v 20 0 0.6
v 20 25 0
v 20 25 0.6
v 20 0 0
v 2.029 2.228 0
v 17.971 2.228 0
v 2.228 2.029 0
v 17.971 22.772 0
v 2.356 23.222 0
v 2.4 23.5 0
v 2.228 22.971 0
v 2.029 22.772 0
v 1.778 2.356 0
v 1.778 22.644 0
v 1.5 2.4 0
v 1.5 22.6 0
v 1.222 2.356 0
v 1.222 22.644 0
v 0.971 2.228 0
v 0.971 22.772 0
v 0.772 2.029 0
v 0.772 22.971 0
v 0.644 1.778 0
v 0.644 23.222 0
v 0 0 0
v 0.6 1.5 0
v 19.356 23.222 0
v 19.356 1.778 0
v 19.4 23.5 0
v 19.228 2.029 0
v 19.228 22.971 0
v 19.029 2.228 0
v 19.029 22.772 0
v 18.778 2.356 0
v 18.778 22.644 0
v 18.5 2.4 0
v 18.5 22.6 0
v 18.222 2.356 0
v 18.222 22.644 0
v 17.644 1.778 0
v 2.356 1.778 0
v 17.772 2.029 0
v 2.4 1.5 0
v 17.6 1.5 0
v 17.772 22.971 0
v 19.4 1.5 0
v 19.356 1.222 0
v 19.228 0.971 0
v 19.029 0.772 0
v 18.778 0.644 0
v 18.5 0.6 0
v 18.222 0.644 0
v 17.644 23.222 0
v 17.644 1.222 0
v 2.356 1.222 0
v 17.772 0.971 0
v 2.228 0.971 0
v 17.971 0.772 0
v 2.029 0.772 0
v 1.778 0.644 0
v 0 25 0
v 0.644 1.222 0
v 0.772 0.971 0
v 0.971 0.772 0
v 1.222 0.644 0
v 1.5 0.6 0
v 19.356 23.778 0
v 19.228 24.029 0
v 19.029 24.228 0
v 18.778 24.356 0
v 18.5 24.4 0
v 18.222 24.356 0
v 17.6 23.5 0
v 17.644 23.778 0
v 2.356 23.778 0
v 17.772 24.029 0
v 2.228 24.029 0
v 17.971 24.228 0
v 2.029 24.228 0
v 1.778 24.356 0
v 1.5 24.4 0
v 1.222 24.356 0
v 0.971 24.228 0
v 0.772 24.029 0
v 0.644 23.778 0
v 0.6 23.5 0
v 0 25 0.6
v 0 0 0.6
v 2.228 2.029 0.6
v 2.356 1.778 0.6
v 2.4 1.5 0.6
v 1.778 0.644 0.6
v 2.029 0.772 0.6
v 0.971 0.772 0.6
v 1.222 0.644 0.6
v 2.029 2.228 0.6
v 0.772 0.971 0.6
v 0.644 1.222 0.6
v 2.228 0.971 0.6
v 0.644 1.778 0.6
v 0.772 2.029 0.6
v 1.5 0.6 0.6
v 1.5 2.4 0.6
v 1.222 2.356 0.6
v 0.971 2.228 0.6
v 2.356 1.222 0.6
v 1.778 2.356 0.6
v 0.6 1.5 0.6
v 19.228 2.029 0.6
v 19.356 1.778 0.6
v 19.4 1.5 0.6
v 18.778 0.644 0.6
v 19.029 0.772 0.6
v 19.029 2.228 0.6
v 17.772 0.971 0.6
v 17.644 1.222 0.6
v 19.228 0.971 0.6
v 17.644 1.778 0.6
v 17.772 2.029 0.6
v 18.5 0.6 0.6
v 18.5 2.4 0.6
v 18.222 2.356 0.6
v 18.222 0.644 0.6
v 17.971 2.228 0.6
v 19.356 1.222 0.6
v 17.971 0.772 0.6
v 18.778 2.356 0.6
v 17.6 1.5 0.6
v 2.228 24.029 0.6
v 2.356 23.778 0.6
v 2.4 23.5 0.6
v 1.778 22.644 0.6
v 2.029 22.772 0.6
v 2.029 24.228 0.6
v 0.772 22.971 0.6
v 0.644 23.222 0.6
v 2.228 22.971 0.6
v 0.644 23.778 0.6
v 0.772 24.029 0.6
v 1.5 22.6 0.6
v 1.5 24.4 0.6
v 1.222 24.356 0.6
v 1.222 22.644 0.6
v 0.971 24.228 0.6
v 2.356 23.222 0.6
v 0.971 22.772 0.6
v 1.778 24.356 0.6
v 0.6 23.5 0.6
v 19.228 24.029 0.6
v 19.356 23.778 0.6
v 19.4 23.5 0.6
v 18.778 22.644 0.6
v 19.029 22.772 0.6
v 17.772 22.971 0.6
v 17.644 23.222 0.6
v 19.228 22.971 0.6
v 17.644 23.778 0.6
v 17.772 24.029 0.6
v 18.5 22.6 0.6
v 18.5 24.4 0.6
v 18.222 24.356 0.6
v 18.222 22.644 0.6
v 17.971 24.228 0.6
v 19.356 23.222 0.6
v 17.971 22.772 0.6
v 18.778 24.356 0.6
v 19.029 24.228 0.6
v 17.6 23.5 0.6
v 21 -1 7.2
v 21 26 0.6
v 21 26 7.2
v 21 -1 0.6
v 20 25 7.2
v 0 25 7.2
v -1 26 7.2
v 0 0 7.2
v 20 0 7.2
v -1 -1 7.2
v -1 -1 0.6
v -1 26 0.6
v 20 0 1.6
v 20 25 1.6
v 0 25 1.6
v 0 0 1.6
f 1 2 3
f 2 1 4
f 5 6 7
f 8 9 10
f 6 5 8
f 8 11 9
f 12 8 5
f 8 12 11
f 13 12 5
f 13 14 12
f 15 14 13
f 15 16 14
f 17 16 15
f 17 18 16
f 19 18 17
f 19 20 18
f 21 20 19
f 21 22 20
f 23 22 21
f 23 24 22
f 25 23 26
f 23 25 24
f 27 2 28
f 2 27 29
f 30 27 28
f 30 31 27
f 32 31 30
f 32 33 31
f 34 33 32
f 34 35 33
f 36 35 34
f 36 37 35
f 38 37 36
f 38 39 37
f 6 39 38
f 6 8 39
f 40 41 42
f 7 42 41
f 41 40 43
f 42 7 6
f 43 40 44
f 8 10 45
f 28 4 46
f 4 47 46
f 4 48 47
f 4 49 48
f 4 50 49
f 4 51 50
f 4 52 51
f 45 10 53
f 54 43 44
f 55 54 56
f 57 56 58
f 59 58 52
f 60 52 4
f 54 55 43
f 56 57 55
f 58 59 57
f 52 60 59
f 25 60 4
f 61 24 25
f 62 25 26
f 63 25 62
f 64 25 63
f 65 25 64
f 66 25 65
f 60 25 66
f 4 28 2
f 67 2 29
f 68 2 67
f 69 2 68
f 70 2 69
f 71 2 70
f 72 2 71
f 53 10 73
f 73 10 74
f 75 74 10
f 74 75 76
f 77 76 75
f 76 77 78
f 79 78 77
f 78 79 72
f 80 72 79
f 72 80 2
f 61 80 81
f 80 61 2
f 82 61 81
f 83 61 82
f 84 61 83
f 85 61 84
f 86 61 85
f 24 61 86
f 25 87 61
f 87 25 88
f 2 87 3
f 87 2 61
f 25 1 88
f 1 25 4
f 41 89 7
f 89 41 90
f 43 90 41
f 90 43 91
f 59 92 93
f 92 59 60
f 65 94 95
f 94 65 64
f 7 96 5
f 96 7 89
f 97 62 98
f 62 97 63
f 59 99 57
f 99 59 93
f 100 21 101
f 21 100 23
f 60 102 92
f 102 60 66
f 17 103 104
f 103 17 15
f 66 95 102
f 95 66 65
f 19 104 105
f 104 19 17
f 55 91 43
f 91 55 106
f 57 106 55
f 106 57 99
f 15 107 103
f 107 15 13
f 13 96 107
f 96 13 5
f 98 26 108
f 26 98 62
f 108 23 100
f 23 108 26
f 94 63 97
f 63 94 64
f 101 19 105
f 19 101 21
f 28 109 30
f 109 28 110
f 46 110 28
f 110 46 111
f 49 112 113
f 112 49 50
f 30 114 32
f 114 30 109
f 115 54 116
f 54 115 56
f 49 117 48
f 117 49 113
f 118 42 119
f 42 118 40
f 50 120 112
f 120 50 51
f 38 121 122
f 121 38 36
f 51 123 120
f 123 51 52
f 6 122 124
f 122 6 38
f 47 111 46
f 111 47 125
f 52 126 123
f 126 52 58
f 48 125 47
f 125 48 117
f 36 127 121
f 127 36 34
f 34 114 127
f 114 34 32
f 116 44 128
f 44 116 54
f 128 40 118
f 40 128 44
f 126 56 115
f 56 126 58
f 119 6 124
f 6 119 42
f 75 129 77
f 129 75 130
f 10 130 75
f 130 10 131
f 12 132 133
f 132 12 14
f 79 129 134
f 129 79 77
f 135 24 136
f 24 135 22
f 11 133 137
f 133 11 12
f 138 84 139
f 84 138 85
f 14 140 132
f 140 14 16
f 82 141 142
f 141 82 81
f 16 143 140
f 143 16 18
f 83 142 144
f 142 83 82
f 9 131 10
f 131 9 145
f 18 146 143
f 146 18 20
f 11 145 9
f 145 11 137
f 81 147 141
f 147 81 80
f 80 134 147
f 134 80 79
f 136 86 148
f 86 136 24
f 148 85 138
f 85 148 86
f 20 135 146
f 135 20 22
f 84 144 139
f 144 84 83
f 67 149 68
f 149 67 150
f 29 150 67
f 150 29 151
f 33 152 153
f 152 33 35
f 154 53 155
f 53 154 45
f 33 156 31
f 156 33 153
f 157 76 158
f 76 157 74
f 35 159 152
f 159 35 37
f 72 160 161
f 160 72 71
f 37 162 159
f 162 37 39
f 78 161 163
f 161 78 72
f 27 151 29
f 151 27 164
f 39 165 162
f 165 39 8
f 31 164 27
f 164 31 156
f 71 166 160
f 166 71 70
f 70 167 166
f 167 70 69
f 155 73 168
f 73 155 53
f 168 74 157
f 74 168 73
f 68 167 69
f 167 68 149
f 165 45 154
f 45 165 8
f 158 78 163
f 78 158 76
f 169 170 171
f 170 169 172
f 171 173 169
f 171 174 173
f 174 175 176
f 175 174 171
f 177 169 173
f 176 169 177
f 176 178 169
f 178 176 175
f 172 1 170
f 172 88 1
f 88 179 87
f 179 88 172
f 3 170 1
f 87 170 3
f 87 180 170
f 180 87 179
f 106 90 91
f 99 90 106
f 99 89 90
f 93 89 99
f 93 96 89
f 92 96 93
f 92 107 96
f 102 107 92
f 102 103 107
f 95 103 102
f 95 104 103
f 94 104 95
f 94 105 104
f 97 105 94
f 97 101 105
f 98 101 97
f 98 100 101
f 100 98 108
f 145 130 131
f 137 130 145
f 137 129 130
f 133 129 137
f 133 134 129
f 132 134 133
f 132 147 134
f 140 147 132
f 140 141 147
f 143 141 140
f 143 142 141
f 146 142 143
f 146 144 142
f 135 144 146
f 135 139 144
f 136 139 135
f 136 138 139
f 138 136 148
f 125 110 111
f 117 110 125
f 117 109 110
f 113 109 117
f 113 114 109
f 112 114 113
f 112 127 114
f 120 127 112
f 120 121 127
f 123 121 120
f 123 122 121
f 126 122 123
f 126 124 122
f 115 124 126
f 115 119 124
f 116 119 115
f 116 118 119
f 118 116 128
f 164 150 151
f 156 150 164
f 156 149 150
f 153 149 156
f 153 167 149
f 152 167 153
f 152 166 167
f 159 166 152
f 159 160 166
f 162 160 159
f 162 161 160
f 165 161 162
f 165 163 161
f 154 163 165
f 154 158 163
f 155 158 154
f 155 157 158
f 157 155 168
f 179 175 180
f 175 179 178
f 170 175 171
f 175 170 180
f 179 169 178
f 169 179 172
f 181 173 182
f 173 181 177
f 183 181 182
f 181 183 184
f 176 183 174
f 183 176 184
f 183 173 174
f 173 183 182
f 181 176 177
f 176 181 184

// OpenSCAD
// Headstage Aggregator PCB Mockup
// Dimensions: 20mm x 25mm (Target)
pcb_width = 20;
pcb_length = 25;
pcb_thickness = 1.6;
hole_dia = 1.8; // M1.6 clearance
hole_inset = 1.5;

module pcb() {
    color("green")
    difference() {
        cube([pcb_width, pcb_length, pcb_thickness]);
        // Holes
        translate([hole_inset, hole_inset, -1]) cylinder(h=pcb_thickness+2, d=hole_dia, $fn=20);
        translate([pcb_width-hole_inset, hole_inset, -1]) cylinder(h=pcb_thickness+2, d=hole_dia, $fn=20);
        translate([hole_inset, pcb_length-hole_inset, -1]) cylinder(h=pcb_thickness+2, d=hole_dia, $fn=20);
        translate([pcb_width-hole_inset, pcb_length-hole_inset, -1]) cylinder(h=pcb_thickness+2, d=hole_dia, $fn=20);
    }
}

// Basic case shell (Concept)
module case_shell() {
    wall = 1.0;
    color("gray", 0.5)
    difference() {
        translate([-wall, -wall, -wall]) cube([pcb_width+2*wall, pcb_length+2*wall, pcb_thickness+5]); 
        translate([0,0,0]) cube([pcb_width, pcb_length, 10]); // Internal cavity
    }
}

// Render
pcb();
translate([0,0, pcb_thickness]) case_shell();
